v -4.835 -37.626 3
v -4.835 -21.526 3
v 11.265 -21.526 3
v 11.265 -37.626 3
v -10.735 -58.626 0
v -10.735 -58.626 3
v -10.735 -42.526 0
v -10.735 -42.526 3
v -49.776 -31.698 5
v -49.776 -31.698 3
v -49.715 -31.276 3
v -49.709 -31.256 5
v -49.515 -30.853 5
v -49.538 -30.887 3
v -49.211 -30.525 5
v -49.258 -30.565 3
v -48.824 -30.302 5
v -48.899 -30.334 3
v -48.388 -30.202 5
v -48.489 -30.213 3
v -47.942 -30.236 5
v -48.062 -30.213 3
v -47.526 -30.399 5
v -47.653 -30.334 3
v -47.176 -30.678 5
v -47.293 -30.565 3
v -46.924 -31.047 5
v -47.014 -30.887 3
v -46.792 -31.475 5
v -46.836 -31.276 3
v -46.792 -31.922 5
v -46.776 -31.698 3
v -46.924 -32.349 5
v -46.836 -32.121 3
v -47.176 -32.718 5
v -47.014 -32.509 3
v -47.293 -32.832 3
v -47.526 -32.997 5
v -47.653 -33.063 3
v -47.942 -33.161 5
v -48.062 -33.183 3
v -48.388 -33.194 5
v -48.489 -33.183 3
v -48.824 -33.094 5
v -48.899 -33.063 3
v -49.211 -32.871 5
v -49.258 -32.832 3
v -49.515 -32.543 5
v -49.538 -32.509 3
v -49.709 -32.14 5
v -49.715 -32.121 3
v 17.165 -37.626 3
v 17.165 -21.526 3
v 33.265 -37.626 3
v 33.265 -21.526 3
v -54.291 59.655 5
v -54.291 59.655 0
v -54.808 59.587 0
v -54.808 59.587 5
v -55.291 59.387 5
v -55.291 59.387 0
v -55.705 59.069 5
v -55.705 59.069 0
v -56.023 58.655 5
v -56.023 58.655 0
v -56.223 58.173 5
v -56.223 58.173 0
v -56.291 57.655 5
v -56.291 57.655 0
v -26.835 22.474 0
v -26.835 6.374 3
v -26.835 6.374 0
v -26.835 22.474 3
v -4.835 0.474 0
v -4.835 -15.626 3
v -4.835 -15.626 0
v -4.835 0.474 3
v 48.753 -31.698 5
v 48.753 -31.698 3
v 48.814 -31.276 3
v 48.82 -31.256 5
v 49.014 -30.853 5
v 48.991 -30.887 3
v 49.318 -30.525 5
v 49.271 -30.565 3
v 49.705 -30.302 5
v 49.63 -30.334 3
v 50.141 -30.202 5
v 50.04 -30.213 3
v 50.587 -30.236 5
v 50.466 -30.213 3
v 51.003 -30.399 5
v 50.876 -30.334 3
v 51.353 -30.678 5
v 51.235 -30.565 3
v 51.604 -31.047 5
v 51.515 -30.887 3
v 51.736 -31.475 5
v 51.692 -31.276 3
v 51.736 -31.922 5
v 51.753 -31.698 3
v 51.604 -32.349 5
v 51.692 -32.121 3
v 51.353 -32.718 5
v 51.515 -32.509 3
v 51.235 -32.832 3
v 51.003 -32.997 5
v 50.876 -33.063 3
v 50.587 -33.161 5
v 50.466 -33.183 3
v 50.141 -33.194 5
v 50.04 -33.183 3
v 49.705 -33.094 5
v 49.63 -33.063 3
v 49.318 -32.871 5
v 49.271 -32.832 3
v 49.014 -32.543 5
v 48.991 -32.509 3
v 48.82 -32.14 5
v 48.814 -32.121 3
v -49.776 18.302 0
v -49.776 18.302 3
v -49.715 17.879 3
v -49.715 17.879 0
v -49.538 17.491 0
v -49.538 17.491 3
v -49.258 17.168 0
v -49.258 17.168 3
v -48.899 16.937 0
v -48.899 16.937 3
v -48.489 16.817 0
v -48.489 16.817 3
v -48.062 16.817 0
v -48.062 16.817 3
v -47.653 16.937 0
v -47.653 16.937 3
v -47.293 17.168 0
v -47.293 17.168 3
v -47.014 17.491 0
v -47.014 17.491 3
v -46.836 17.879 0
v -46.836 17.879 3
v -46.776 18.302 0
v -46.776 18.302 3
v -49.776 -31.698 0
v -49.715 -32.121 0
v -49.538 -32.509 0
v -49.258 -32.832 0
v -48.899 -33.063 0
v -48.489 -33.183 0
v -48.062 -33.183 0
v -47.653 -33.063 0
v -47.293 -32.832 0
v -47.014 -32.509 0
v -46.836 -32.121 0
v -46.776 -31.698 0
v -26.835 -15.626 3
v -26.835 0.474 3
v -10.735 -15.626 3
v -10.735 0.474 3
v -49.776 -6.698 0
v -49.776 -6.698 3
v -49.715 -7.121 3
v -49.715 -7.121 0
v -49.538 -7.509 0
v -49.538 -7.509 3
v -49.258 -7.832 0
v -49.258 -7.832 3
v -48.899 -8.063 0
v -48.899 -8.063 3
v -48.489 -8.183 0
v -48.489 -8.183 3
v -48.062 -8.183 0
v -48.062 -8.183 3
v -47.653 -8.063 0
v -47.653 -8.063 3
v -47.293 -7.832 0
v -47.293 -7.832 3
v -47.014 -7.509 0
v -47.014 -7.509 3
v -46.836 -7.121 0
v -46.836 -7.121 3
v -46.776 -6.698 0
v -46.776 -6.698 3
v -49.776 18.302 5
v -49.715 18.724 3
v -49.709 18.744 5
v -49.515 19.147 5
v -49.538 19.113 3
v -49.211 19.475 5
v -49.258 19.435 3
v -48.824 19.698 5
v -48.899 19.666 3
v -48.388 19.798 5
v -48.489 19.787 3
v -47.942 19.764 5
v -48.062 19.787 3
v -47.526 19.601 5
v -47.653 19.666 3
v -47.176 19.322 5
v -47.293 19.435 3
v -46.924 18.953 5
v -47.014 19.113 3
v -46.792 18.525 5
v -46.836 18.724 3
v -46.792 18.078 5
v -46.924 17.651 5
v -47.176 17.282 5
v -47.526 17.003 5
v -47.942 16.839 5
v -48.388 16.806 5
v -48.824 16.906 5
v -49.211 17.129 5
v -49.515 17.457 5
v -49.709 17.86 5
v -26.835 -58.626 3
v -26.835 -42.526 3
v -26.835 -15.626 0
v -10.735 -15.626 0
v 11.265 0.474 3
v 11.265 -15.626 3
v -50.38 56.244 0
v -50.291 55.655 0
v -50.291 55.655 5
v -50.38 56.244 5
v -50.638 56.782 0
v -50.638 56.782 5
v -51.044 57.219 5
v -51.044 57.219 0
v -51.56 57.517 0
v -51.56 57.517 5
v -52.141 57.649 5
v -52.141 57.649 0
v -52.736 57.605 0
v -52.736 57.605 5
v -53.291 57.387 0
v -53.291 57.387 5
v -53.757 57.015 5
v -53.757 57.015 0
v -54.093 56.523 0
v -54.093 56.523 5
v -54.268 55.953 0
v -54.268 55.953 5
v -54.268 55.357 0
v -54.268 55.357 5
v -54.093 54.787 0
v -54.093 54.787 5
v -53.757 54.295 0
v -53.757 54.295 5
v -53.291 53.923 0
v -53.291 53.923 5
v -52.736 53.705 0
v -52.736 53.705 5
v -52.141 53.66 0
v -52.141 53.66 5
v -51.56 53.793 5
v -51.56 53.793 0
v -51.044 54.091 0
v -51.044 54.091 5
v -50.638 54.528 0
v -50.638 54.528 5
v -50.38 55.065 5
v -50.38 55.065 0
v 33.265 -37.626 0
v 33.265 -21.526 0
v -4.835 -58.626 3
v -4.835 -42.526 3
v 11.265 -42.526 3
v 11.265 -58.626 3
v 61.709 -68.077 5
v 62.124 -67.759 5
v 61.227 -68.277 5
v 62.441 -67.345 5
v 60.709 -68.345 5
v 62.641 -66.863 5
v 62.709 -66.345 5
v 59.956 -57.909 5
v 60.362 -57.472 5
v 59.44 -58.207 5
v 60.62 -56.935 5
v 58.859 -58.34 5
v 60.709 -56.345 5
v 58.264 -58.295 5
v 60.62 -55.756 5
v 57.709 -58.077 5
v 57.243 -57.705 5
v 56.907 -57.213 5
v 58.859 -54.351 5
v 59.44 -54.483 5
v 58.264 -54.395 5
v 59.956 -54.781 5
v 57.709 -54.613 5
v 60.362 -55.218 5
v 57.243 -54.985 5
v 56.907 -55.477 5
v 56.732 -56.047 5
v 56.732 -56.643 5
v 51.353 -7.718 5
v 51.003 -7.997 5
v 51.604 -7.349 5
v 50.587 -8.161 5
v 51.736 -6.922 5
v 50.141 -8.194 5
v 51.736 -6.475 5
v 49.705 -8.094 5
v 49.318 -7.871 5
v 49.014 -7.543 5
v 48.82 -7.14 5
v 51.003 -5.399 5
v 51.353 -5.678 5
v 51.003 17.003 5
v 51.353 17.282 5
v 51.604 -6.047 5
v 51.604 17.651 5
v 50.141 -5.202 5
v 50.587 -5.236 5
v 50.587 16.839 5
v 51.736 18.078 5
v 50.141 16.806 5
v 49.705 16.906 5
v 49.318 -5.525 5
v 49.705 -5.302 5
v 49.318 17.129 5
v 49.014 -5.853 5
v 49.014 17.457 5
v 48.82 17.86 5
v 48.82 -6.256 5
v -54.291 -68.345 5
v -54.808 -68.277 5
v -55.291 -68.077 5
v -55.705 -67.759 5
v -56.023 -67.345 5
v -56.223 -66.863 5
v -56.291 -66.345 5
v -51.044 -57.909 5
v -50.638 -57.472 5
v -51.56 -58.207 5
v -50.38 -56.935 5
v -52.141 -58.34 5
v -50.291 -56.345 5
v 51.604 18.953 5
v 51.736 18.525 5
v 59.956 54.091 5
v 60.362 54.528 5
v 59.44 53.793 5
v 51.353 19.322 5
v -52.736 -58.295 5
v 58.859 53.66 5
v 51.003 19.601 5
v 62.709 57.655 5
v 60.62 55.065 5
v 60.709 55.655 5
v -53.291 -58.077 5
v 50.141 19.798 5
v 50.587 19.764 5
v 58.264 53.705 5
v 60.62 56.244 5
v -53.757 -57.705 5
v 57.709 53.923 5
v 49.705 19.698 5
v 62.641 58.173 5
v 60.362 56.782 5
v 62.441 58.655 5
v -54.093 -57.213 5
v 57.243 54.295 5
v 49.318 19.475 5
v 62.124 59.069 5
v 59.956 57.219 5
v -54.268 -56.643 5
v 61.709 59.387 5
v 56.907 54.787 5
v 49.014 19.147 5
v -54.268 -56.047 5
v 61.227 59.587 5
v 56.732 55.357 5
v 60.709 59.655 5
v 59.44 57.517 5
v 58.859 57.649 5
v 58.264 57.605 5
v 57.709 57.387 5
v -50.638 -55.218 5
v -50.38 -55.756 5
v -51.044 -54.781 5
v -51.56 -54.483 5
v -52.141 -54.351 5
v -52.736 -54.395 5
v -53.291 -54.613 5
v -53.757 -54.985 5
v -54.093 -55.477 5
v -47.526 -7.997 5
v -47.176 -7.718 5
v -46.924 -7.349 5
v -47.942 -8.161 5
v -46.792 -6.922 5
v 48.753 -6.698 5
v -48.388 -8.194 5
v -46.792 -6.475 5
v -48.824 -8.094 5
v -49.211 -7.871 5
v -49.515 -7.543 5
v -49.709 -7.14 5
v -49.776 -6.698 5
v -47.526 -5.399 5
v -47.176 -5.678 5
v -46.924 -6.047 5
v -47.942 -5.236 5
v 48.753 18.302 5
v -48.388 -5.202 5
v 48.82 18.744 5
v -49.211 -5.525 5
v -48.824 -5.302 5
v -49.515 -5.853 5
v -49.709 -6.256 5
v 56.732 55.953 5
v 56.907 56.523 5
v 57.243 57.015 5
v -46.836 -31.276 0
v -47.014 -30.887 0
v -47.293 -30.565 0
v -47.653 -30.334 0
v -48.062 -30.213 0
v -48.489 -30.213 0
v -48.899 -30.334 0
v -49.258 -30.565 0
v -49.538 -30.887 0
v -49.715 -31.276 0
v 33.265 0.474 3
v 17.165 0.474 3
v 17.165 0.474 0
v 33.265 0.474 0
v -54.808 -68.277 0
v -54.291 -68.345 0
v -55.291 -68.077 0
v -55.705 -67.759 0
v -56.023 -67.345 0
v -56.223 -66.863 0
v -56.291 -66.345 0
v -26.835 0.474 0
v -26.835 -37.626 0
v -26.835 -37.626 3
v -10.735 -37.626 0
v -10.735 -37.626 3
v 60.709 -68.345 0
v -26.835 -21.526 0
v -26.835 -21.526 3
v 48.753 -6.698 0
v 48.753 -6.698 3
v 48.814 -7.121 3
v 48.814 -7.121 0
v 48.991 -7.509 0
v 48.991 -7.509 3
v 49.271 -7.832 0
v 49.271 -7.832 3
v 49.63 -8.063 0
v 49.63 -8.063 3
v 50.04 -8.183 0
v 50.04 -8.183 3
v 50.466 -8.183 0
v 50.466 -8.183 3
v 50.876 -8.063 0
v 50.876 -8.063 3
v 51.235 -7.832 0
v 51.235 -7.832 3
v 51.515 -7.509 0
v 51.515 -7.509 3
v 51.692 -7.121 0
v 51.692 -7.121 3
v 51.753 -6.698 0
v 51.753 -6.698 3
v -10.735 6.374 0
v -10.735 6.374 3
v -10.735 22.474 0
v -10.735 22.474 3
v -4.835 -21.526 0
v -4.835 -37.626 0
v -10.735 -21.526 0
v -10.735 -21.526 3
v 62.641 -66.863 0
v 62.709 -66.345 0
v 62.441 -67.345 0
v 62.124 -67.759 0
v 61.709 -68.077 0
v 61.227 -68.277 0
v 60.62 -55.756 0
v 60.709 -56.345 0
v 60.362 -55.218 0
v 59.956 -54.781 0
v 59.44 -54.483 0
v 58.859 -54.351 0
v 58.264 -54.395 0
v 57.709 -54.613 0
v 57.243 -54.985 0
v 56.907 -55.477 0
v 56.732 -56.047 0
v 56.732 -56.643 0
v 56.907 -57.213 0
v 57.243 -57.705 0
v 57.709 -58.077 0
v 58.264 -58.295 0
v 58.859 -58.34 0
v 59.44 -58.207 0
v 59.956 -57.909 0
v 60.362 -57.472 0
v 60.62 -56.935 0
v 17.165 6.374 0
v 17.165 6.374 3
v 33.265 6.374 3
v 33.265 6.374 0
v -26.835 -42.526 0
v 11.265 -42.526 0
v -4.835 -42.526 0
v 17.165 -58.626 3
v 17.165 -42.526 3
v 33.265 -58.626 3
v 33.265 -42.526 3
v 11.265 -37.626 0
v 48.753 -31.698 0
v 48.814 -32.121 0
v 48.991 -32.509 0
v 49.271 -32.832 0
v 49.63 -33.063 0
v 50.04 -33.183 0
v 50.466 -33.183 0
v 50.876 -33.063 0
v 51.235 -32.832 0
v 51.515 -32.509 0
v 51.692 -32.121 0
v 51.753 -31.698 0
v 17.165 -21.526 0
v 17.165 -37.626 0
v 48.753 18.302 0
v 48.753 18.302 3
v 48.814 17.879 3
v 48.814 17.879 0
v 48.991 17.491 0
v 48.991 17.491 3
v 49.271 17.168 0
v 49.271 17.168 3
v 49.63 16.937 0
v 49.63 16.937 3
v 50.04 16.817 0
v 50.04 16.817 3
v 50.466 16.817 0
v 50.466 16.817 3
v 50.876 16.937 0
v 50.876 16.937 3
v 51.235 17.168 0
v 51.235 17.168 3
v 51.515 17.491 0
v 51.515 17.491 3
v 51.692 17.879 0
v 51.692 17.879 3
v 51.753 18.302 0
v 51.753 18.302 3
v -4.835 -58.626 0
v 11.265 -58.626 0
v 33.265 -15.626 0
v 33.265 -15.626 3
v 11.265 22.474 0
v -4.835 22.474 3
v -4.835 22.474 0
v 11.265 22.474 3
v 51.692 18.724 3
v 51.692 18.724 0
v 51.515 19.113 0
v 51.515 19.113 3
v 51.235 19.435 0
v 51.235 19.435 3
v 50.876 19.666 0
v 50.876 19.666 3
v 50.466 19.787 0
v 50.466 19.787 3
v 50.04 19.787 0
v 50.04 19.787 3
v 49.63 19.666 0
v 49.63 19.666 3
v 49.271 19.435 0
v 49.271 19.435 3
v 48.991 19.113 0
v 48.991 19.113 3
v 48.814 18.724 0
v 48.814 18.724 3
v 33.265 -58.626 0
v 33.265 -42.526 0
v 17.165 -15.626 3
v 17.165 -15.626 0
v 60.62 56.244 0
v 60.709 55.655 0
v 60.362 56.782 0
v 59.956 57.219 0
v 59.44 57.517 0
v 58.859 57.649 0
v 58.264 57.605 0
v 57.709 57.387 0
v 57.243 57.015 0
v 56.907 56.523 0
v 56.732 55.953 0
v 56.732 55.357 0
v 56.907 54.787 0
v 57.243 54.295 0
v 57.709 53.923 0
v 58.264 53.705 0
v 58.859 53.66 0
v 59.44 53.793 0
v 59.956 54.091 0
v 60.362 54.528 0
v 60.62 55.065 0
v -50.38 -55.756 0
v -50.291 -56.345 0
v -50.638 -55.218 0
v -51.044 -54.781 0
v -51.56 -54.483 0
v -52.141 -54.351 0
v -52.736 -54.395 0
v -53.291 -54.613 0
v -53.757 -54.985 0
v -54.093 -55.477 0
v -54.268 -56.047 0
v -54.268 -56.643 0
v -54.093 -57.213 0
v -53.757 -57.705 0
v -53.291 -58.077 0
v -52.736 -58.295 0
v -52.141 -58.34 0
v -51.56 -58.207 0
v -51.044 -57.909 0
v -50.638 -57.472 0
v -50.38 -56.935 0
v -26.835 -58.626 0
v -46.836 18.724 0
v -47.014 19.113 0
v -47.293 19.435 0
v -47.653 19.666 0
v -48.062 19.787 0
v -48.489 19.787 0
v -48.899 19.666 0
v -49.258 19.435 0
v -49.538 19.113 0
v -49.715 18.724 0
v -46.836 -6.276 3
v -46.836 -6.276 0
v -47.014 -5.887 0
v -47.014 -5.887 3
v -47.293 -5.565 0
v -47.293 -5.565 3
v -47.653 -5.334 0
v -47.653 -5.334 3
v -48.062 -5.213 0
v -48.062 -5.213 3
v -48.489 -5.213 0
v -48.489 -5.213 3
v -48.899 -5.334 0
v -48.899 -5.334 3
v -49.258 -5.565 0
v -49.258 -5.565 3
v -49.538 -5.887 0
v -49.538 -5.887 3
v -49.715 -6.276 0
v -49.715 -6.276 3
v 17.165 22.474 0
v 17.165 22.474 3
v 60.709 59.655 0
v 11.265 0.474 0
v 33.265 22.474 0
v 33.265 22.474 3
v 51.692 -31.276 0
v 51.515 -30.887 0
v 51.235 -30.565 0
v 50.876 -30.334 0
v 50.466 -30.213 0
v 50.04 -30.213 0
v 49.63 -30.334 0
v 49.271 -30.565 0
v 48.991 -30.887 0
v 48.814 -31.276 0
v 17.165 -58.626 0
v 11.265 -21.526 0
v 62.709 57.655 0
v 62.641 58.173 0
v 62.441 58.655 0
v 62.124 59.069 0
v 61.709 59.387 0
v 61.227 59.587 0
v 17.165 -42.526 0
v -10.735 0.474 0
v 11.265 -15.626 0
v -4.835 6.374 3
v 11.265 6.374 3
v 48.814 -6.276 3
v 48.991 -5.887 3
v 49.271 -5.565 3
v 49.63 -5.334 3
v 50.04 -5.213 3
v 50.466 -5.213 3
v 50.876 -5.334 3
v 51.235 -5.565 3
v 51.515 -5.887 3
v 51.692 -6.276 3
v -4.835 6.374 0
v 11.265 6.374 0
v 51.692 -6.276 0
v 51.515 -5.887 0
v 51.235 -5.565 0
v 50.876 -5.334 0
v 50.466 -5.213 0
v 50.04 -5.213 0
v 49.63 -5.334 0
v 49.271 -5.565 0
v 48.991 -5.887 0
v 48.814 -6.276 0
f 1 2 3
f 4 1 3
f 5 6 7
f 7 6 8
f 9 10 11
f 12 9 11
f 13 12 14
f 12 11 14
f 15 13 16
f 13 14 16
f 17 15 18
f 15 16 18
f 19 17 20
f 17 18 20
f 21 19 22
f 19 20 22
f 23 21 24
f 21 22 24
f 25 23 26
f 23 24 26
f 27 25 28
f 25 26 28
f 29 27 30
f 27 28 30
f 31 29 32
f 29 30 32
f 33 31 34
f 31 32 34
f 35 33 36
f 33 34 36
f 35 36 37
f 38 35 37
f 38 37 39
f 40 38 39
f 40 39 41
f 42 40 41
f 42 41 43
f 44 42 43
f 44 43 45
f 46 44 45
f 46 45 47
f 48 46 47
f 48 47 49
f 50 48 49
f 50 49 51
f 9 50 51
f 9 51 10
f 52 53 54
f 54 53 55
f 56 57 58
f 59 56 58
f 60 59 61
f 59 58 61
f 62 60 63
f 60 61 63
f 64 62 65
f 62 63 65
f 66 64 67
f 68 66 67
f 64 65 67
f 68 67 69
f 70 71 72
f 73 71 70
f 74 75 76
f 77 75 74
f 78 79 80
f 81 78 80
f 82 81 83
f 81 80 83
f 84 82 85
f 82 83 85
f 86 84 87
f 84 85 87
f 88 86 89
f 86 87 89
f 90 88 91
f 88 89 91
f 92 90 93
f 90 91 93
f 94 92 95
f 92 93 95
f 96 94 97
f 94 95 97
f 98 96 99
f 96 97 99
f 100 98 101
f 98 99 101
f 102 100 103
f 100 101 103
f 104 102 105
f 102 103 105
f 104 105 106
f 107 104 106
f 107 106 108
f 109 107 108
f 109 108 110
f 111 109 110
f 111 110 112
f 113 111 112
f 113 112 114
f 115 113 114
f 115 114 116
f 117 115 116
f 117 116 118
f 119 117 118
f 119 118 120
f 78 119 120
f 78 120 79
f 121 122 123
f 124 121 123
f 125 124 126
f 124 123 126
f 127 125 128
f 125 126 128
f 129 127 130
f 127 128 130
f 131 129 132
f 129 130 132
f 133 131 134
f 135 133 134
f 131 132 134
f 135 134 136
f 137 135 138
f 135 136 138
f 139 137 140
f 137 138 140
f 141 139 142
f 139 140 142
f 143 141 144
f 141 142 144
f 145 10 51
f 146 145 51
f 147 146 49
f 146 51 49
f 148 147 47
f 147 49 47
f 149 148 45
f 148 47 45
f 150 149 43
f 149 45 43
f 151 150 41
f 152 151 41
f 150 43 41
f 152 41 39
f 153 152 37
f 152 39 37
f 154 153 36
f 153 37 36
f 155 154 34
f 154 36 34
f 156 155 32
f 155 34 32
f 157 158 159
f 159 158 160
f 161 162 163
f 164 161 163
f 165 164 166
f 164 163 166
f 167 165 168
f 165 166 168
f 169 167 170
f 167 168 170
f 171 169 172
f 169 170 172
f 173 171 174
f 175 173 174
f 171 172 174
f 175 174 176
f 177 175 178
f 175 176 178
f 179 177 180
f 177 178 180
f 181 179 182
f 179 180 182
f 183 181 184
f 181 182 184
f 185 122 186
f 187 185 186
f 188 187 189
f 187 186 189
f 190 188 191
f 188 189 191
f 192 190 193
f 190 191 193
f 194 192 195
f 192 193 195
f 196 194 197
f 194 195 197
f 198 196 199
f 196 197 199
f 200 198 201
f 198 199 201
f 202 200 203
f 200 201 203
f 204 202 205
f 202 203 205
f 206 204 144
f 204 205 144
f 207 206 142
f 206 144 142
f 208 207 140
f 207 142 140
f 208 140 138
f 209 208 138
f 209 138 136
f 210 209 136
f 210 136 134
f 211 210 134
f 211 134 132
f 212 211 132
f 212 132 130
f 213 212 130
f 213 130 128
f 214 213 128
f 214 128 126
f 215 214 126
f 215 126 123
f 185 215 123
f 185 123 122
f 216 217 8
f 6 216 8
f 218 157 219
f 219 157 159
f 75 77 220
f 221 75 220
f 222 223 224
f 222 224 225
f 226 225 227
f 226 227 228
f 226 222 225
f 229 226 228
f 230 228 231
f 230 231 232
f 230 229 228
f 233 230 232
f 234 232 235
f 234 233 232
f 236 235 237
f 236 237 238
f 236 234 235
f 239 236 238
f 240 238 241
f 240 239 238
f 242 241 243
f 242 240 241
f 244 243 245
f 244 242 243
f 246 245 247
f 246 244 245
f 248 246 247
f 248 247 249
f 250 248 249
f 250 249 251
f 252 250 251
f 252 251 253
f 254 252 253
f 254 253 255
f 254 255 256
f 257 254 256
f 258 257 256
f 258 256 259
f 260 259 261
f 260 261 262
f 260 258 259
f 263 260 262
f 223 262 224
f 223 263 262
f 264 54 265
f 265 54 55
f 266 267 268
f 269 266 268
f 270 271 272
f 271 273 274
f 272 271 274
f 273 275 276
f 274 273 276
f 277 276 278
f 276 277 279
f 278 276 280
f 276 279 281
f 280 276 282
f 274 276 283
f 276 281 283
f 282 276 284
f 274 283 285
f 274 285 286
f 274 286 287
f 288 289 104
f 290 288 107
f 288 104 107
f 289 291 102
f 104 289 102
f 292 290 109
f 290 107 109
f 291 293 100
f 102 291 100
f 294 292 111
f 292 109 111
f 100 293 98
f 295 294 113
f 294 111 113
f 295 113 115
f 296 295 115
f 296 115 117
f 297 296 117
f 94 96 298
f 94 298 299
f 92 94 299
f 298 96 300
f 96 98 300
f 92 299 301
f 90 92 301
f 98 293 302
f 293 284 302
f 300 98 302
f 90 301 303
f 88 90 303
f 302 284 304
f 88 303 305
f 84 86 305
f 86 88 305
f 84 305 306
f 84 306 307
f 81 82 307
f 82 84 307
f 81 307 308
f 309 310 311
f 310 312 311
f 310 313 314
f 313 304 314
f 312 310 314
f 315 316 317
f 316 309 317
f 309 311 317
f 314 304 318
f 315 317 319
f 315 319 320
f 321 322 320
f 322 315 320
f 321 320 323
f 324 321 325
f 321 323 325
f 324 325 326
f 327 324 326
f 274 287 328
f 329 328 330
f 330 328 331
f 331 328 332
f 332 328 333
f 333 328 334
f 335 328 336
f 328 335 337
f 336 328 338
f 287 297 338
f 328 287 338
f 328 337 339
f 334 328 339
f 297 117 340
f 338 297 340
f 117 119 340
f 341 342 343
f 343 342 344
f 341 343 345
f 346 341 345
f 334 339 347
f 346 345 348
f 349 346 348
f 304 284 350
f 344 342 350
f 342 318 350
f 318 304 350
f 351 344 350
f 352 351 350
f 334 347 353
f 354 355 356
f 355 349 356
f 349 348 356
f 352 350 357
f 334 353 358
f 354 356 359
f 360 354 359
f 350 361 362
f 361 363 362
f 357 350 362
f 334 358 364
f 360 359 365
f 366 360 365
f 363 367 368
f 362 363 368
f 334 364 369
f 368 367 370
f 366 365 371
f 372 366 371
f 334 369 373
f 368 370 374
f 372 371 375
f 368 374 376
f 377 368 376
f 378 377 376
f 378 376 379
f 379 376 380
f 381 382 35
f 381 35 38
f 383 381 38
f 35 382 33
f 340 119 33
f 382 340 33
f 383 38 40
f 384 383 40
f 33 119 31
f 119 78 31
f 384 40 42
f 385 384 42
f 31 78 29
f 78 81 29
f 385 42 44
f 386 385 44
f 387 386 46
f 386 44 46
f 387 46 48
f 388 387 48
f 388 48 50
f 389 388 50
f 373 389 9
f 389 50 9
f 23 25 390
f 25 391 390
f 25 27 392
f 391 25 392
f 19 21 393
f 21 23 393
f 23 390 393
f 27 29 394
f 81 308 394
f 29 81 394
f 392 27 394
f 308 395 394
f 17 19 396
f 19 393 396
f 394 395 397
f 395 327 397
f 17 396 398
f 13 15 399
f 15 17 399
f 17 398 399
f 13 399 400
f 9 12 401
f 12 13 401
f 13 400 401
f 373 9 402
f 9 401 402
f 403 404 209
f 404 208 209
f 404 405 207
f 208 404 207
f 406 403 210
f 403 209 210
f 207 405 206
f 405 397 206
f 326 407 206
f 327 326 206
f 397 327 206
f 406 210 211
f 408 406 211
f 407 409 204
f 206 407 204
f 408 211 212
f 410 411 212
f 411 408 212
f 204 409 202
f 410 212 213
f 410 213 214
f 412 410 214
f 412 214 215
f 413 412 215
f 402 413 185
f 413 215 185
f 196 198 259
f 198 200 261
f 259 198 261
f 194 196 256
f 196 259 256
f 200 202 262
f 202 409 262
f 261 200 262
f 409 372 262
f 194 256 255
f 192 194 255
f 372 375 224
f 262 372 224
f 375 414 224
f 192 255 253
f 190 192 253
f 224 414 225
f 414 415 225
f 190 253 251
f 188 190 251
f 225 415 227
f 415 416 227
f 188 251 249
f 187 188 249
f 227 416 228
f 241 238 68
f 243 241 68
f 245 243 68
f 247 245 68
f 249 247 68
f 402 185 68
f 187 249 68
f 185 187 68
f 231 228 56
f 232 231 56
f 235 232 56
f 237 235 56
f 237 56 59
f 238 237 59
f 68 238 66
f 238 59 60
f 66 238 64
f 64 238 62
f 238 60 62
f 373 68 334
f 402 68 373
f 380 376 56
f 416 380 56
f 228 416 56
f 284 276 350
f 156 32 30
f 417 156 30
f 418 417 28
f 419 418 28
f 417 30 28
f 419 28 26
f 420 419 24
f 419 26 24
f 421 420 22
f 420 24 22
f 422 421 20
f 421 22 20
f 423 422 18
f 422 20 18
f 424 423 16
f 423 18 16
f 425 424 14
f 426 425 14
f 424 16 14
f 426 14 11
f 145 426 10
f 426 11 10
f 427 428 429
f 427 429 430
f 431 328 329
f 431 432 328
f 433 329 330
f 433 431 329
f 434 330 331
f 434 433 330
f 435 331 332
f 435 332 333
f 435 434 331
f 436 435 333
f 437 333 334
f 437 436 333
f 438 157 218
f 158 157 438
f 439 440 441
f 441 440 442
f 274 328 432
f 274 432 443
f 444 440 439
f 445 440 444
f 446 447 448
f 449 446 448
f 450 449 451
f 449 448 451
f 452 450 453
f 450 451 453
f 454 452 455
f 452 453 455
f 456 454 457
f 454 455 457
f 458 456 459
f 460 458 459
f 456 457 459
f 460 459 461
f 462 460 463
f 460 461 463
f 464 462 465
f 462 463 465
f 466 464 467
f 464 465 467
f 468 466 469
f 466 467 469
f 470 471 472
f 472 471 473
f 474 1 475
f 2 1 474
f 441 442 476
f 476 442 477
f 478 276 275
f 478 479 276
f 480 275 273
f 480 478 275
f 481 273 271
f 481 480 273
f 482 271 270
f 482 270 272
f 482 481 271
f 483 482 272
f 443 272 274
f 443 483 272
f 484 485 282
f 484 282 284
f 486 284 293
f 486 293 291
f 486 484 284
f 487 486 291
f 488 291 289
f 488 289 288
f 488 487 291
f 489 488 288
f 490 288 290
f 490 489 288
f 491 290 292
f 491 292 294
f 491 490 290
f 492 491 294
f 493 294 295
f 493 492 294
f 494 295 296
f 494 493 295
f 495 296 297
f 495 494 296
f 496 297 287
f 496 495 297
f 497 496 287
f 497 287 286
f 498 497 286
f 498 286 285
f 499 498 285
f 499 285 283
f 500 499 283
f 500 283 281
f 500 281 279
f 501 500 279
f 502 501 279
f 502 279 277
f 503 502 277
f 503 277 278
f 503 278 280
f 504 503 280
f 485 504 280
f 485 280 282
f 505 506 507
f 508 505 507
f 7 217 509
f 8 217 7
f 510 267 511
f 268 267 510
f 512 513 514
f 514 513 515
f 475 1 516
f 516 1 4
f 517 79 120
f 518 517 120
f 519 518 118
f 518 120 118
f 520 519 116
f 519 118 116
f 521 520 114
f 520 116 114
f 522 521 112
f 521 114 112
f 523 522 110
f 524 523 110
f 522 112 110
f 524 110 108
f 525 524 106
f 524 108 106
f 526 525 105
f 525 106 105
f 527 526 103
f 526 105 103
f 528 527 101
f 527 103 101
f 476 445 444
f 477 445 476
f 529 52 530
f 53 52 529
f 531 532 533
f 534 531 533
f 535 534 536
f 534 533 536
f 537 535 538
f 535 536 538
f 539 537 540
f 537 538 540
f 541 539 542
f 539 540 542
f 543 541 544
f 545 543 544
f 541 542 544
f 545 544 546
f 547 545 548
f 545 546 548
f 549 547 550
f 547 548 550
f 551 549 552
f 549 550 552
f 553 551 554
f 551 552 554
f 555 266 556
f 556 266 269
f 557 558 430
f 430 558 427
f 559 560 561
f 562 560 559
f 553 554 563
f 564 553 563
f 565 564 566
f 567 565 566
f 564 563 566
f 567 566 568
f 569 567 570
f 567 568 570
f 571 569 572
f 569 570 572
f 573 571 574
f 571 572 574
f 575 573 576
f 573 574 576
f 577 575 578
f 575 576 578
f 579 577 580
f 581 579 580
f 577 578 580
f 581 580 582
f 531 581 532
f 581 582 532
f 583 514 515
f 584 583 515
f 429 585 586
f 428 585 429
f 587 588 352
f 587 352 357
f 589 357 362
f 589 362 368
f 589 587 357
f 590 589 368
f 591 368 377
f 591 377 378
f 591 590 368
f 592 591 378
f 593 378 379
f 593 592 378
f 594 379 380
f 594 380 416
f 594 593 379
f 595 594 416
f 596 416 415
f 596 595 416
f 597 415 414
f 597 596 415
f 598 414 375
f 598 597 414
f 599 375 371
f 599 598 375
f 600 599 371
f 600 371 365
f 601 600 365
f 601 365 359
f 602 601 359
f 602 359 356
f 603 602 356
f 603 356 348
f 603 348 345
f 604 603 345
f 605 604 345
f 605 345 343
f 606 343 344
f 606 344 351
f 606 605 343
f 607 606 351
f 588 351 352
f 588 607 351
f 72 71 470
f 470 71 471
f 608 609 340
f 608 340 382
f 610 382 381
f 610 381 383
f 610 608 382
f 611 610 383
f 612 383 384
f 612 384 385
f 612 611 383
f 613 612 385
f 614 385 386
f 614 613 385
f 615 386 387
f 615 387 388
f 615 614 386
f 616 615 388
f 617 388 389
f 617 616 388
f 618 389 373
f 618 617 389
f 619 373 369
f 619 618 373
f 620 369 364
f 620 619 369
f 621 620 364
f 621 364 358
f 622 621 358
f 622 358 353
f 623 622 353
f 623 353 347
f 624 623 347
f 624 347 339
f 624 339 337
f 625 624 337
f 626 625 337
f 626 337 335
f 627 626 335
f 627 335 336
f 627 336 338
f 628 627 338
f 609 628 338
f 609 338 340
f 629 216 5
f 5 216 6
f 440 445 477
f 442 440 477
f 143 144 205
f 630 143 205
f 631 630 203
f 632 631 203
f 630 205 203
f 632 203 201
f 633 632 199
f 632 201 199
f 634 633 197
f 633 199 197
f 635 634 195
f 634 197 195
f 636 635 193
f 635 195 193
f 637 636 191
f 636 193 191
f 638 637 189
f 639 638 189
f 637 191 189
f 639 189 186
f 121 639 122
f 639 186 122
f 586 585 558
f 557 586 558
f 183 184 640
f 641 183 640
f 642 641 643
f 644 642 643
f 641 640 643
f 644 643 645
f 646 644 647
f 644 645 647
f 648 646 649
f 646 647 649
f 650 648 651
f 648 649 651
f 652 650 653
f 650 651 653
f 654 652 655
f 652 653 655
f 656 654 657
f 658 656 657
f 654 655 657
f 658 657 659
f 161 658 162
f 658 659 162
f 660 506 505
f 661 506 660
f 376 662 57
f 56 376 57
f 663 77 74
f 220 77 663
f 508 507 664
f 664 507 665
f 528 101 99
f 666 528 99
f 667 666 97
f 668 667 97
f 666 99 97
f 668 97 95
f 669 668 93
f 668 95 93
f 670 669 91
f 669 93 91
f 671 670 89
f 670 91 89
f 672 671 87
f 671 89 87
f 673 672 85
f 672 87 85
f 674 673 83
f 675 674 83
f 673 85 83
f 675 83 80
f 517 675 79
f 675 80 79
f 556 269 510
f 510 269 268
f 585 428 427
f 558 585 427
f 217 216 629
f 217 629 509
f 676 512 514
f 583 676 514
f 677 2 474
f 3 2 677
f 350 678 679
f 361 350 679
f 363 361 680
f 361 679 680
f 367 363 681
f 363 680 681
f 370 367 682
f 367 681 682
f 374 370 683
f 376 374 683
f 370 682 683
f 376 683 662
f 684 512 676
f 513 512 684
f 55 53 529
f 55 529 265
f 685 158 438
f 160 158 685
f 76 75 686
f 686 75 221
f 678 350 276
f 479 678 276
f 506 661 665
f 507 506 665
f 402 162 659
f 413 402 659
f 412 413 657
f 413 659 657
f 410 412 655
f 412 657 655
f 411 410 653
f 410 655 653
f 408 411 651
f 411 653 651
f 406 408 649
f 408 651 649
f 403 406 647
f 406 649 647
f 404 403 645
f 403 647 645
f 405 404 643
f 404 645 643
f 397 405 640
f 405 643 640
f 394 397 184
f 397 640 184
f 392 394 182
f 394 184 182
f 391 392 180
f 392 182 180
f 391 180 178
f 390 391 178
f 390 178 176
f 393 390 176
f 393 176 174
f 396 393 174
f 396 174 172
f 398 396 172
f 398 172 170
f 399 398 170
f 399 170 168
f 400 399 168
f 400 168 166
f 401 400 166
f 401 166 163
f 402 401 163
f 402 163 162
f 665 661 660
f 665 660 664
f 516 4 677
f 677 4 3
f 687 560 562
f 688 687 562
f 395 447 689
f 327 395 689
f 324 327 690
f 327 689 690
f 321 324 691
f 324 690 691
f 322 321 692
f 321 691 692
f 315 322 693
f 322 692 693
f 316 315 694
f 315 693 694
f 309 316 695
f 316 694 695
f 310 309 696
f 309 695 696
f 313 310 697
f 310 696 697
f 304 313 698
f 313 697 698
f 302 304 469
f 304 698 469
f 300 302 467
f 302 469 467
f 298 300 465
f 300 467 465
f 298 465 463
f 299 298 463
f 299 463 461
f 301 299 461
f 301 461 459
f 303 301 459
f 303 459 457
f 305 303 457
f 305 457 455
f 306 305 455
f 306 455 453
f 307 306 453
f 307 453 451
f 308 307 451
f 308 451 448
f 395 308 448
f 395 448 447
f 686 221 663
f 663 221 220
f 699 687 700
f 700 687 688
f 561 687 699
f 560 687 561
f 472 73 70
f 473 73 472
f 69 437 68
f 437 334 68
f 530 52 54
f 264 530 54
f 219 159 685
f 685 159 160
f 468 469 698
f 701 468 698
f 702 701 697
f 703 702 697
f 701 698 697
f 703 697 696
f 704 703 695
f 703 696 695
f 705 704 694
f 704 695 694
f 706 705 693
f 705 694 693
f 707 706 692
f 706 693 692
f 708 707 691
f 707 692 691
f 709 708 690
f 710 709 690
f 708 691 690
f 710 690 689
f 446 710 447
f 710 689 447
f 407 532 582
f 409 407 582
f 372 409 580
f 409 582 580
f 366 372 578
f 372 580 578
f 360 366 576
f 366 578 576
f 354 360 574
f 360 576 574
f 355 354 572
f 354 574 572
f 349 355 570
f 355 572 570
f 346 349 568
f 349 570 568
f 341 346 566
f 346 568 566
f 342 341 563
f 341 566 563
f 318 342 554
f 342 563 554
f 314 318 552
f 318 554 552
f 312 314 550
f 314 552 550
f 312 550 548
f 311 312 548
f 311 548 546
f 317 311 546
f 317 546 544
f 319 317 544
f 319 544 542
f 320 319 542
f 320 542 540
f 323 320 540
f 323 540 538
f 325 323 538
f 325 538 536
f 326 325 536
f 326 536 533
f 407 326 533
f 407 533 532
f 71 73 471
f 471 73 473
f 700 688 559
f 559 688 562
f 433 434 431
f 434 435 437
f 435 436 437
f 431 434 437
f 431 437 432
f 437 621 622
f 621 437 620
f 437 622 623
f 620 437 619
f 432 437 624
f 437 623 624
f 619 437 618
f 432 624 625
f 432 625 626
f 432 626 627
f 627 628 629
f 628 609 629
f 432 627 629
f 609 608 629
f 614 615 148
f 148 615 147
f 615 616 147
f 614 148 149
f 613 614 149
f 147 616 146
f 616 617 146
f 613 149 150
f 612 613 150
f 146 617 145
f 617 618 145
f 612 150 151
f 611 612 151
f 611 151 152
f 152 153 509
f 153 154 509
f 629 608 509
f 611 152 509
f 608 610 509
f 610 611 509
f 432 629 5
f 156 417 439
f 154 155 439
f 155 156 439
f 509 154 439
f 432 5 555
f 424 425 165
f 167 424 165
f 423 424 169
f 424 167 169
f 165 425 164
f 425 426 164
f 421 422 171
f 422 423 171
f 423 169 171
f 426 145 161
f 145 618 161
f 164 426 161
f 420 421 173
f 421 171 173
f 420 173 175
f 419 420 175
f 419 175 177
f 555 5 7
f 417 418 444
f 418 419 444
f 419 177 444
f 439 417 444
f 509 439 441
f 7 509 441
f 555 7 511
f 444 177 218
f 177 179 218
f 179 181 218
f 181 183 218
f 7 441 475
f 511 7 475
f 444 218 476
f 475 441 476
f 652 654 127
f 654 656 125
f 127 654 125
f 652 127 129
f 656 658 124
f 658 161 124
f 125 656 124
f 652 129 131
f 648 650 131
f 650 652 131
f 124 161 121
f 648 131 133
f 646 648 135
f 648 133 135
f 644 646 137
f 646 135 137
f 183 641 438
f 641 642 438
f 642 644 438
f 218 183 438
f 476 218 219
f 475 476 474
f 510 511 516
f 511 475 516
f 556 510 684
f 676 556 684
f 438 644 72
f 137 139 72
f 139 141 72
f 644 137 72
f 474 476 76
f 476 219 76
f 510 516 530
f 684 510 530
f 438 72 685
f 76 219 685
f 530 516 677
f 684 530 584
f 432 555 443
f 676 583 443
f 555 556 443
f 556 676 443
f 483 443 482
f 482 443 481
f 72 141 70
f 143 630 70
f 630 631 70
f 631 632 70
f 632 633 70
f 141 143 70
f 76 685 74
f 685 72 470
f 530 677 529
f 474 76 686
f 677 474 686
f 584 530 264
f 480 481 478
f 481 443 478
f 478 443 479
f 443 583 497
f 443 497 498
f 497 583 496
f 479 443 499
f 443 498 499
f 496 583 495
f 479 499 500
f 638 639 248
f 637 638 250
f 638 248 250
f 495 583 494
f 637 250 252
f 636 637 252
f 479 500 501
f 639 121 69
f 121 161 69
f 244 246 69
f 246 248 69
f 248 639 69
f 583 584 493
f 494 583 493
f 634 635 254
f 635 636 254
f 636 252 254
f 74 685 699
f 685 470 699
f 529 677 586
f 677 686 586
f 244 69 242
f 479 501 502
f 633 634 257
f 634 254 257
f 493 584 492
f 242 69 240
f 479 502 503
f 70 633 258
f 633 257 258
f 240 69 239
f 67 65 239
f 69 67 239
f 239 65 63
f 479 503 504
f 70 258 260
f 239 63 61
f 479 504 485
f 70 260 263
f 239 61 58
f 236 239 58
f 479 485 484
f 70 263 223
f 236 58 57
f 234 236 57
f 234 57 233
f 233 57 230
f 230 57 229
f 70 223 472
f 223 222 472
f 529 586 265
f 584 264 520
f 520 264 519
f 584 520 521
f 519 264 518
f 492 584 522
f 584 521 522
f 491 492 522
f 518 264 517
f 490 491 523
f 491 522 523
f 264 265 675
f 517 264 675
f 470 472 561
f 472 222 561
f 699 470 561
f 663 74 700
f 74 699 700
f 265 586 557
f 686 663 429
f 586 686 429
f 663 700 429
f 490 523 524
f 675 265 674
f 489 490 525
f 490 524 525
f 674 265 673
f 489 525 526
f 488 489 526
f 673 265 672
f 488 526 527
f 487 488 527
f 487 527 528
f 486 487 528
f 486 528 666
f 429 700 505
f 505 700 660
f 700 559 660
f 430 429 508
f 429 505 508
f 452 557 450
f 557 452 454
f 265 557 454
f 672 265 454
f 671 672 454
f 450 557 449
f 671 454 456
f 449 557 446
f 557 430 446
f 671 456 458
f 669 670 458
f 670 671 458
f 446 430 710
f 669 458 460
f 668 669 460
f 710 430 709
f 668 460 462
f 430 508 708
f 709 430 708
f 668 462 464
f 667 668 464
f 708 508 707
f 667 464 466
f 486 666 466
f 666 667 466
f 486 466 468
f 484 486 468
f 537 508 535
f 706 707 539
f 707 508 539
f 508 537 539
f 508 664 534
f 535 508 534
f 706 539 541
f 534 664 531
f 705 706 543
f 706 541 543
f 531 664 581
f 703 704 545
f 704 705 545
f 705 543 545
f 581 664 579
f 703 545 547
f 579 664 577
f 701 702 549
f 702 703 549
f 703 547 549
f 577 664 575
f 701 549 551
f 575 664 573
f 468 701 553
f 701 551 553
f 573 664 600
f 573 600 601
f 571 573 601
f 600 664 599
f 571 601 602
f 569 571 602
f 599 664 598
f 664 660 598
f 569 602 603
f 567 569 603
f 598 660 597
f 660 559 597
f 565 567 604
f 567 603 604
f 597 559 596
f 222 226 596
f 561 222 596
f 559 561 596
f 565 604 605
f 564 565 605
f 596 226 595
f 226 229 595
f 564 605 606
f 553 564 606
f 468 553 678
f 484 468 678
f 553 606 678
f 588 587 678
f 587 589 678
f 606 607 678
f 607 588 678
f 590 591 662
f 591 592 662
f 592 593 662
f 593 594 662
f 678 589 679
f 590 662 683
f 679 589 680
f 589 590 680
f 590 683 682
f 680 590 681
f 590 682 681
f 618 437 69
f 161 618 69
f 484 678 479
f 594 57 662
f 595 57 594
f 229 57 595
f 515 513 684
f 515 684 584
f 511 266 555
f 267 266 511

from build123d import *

# Parameters (mm, degrees)
SKETCH_1_R          = 2
EXTRUDE_1_DEPTH     = 5
SKETCH_5_R          = 1.5
SKETCH_5_W          = 16.1
SKETCH_5_H          = 16.1
CUT_EXTRUDE_1_DEPTH = 4
EXTRUDE_2_DEPTH     = 5
FILLET_1_R          = 2
SKETCH_9_R          = 1.5
CUT_EXTRUDE_2_DEPTH = 10


with BuildPart() as part:
    # 草图1 → 凸台-拉伸1 (new body)
    with BuildSketch(Plane.XY):
        with BuildLine():
            Line((62.7093167, -58.345136948), (62.7093167, 57.654863052))
            ThreePointArc((62.7093167, 57.654863052), (62.123530262, 59.069076614), (60.7093167, 59.654863052))
            Line((60.7093167, 59.654863052), (-54.2906833, 59.654863052))
            ThreePointArc((-54.2906833, 59.654863052), (-55.704896862, 59.069076614), (-56.2906833, 57.654863052))
            Line((-56.2906833, 57.654863052), (-56.2906833, -58.345136948))
            ThreePointArc((-56.2906833, -58.345136948), (-55.704896862, -59.759350511), (-54.2906833, -60.345136948))
            Line((-54.2906833, -60.345136948), (60.7093167, -60.345136948))
            ThreePointArc((60.7093167, -60.345136948), (62.123530262, -59.759350511), (62.7093167, -58.345136948))
        make_face()
        with Locations((-52.2906833, -56.345136948)):
            Circle(SKETCH_1_R, mode=Mode.SUBTRACT)
        with Locations((58.7093167, -56.345136948)):
            Circle(SKETCH_1_R, mode=Mode.SUBTRACT)
        with Locations((58.7093167, 55.654863052)):
            Circle(SKETCH_1_R, mode=Mode.SUBTRACT)
        with Locations((-52.2906833, 55.654863052)):
            Circle(SKETCH_1_R, mode=Mode.SUBTRACT)
    extrude(amount=EXTRUDE_1_DEPTH)

    # 草图5 → 切除-拉伸1 (cut, through all)
    with BuildSketch(Plane.XY.offset(3)):
        with Locations((-48.275635297, 18.301860934)):
            Circle(SKETCH_5_R)
        with Locations((50.252991339, 18.301860934)):
            Circle(SKETCH_5_R)
        with Locations((-48.275635297, -6.698139066)):
            Circle(SKETCH_5_R)
        with Locations((50.252991339, -6.698139066)):
            Circle(SKETCH_5_R)
        with Locations((-48.275635297, -31.698139066)):
            Circle(SKETCH_5_R)
        with Locations((50.252991339, -31.698139066)):
            Circle(SKETCH_5_R)
        with Locations((25.214825615, -7.576393001)):
            Rectangle(SKETCH_5_W, SKETCH_5_H)
        with Locations((25.214825615, 14.423606999)):
            Rectangle(SKETCH_5_W, SKETCH_5_H)
        with Locations((3.214825615, -7.576393001)):
            Rectangle(SKETCH_5_W, SKETCH_5_H)
        with Locations((-18.785174385, 14.423606999)):
            Rectangle(SKETCH_5_W, SKETCH_5_H)
        with Locations((-18.785174385, -7.576393001)):
            Rectangle(SKETCH_5_W, SKETCH_5_H)
        with Locations((-18.785174385, -29.576393001)):
            Rectangle(SKETCH_5_W, SKETCH_5_H)
        with Locations((3.214825615, 14.423606999)):
            Rectangle(SKETCH_5_W, SKETCH_5_H)
        with Locations((3.214825615, -29.576393001)):
            Rectangle(SKETCH_5_W, SKETCH_5_H)
        with Locations((25.214825615, -29.576393001)):
            Rectangle(SKETCH_5_W, SKETCH_5_H)
        with Locations((25.214825615, -50.576393001)):
            Rectangle(SKETCH_5_W, SKETCH_5_H)
        with Locations((3.214825615, -50.576393001)):
            Rectangle(SKETCH_5_W, SKETCH_5_H)
        with Locations((-18.785174385, -50.576393001)):
            Rectangle(SKETCH_5_W, SKETCH_5_H)
    extrude(amount=-CUT_EXTRUDE_1_DEPTH, mode=Mode.SUBTRACT)

    # 草图8 → 凸台-拉伸2 (add)
    with BuildSketch(Plane.XY.offset(5)):
        Polygon((-56.2906833, -58.345136948), (-26.835174385, -58.345136948), (-26.835174385, -60.345136948), (33.264825615, -60.345136948), (33.264825615, -58.345136948), (62.7093167, -58.345136948), (62.7093167, -68.345136948), (33.264825615, -68.345136948), (-26.835174385, -68.345136948), (-56.2906833, -68.345136948), align=None)
    extrude(amount=-EXTRUDE_2_DEPTH)

    # 圆角1
    fillet_1_edges = [part.edges().sort_by_distance(p)[0] for p in [
        (-56.2906833, -68.345136948, 2.5),
        (62.7093167, -68.345136948, 2.5),
    ]]
    fillet(fillet_1_edges, radius=FILLET_1_R)

    # 草图9 → 切除-拉伸2 (cut)
    with BuildSketch(Plane(origin=(0, 0, 0), x_dir=(-1, 0, 0), z_dir=(0, 0, -1))):
        with Locations((-50.252991339, -6.698139066)):
            Circle(SKETCH_9_R)
        with Locations((-50.252991339, -31.698139066)):
            Circle(SKETCH_9_R)
        with Locations((48.275635297, -31.698139066)):
            Circle(SKETCH_9_R)
        with Locations((48.275635297, -6.698139066)):
            Circle(SKETCH_9_R)
        with Locations((48.275635297, 18.301860934)):
            Circle(SKETCH_9_R)
        with Locations((-50.252991339, 18.301860934)):
            Circle(SKETCH_9_R)
    extrude(amount=-CUT_EXTRUDE_2_DEPTH, mode=Mode.SUBTRACT)


solid = part.part
